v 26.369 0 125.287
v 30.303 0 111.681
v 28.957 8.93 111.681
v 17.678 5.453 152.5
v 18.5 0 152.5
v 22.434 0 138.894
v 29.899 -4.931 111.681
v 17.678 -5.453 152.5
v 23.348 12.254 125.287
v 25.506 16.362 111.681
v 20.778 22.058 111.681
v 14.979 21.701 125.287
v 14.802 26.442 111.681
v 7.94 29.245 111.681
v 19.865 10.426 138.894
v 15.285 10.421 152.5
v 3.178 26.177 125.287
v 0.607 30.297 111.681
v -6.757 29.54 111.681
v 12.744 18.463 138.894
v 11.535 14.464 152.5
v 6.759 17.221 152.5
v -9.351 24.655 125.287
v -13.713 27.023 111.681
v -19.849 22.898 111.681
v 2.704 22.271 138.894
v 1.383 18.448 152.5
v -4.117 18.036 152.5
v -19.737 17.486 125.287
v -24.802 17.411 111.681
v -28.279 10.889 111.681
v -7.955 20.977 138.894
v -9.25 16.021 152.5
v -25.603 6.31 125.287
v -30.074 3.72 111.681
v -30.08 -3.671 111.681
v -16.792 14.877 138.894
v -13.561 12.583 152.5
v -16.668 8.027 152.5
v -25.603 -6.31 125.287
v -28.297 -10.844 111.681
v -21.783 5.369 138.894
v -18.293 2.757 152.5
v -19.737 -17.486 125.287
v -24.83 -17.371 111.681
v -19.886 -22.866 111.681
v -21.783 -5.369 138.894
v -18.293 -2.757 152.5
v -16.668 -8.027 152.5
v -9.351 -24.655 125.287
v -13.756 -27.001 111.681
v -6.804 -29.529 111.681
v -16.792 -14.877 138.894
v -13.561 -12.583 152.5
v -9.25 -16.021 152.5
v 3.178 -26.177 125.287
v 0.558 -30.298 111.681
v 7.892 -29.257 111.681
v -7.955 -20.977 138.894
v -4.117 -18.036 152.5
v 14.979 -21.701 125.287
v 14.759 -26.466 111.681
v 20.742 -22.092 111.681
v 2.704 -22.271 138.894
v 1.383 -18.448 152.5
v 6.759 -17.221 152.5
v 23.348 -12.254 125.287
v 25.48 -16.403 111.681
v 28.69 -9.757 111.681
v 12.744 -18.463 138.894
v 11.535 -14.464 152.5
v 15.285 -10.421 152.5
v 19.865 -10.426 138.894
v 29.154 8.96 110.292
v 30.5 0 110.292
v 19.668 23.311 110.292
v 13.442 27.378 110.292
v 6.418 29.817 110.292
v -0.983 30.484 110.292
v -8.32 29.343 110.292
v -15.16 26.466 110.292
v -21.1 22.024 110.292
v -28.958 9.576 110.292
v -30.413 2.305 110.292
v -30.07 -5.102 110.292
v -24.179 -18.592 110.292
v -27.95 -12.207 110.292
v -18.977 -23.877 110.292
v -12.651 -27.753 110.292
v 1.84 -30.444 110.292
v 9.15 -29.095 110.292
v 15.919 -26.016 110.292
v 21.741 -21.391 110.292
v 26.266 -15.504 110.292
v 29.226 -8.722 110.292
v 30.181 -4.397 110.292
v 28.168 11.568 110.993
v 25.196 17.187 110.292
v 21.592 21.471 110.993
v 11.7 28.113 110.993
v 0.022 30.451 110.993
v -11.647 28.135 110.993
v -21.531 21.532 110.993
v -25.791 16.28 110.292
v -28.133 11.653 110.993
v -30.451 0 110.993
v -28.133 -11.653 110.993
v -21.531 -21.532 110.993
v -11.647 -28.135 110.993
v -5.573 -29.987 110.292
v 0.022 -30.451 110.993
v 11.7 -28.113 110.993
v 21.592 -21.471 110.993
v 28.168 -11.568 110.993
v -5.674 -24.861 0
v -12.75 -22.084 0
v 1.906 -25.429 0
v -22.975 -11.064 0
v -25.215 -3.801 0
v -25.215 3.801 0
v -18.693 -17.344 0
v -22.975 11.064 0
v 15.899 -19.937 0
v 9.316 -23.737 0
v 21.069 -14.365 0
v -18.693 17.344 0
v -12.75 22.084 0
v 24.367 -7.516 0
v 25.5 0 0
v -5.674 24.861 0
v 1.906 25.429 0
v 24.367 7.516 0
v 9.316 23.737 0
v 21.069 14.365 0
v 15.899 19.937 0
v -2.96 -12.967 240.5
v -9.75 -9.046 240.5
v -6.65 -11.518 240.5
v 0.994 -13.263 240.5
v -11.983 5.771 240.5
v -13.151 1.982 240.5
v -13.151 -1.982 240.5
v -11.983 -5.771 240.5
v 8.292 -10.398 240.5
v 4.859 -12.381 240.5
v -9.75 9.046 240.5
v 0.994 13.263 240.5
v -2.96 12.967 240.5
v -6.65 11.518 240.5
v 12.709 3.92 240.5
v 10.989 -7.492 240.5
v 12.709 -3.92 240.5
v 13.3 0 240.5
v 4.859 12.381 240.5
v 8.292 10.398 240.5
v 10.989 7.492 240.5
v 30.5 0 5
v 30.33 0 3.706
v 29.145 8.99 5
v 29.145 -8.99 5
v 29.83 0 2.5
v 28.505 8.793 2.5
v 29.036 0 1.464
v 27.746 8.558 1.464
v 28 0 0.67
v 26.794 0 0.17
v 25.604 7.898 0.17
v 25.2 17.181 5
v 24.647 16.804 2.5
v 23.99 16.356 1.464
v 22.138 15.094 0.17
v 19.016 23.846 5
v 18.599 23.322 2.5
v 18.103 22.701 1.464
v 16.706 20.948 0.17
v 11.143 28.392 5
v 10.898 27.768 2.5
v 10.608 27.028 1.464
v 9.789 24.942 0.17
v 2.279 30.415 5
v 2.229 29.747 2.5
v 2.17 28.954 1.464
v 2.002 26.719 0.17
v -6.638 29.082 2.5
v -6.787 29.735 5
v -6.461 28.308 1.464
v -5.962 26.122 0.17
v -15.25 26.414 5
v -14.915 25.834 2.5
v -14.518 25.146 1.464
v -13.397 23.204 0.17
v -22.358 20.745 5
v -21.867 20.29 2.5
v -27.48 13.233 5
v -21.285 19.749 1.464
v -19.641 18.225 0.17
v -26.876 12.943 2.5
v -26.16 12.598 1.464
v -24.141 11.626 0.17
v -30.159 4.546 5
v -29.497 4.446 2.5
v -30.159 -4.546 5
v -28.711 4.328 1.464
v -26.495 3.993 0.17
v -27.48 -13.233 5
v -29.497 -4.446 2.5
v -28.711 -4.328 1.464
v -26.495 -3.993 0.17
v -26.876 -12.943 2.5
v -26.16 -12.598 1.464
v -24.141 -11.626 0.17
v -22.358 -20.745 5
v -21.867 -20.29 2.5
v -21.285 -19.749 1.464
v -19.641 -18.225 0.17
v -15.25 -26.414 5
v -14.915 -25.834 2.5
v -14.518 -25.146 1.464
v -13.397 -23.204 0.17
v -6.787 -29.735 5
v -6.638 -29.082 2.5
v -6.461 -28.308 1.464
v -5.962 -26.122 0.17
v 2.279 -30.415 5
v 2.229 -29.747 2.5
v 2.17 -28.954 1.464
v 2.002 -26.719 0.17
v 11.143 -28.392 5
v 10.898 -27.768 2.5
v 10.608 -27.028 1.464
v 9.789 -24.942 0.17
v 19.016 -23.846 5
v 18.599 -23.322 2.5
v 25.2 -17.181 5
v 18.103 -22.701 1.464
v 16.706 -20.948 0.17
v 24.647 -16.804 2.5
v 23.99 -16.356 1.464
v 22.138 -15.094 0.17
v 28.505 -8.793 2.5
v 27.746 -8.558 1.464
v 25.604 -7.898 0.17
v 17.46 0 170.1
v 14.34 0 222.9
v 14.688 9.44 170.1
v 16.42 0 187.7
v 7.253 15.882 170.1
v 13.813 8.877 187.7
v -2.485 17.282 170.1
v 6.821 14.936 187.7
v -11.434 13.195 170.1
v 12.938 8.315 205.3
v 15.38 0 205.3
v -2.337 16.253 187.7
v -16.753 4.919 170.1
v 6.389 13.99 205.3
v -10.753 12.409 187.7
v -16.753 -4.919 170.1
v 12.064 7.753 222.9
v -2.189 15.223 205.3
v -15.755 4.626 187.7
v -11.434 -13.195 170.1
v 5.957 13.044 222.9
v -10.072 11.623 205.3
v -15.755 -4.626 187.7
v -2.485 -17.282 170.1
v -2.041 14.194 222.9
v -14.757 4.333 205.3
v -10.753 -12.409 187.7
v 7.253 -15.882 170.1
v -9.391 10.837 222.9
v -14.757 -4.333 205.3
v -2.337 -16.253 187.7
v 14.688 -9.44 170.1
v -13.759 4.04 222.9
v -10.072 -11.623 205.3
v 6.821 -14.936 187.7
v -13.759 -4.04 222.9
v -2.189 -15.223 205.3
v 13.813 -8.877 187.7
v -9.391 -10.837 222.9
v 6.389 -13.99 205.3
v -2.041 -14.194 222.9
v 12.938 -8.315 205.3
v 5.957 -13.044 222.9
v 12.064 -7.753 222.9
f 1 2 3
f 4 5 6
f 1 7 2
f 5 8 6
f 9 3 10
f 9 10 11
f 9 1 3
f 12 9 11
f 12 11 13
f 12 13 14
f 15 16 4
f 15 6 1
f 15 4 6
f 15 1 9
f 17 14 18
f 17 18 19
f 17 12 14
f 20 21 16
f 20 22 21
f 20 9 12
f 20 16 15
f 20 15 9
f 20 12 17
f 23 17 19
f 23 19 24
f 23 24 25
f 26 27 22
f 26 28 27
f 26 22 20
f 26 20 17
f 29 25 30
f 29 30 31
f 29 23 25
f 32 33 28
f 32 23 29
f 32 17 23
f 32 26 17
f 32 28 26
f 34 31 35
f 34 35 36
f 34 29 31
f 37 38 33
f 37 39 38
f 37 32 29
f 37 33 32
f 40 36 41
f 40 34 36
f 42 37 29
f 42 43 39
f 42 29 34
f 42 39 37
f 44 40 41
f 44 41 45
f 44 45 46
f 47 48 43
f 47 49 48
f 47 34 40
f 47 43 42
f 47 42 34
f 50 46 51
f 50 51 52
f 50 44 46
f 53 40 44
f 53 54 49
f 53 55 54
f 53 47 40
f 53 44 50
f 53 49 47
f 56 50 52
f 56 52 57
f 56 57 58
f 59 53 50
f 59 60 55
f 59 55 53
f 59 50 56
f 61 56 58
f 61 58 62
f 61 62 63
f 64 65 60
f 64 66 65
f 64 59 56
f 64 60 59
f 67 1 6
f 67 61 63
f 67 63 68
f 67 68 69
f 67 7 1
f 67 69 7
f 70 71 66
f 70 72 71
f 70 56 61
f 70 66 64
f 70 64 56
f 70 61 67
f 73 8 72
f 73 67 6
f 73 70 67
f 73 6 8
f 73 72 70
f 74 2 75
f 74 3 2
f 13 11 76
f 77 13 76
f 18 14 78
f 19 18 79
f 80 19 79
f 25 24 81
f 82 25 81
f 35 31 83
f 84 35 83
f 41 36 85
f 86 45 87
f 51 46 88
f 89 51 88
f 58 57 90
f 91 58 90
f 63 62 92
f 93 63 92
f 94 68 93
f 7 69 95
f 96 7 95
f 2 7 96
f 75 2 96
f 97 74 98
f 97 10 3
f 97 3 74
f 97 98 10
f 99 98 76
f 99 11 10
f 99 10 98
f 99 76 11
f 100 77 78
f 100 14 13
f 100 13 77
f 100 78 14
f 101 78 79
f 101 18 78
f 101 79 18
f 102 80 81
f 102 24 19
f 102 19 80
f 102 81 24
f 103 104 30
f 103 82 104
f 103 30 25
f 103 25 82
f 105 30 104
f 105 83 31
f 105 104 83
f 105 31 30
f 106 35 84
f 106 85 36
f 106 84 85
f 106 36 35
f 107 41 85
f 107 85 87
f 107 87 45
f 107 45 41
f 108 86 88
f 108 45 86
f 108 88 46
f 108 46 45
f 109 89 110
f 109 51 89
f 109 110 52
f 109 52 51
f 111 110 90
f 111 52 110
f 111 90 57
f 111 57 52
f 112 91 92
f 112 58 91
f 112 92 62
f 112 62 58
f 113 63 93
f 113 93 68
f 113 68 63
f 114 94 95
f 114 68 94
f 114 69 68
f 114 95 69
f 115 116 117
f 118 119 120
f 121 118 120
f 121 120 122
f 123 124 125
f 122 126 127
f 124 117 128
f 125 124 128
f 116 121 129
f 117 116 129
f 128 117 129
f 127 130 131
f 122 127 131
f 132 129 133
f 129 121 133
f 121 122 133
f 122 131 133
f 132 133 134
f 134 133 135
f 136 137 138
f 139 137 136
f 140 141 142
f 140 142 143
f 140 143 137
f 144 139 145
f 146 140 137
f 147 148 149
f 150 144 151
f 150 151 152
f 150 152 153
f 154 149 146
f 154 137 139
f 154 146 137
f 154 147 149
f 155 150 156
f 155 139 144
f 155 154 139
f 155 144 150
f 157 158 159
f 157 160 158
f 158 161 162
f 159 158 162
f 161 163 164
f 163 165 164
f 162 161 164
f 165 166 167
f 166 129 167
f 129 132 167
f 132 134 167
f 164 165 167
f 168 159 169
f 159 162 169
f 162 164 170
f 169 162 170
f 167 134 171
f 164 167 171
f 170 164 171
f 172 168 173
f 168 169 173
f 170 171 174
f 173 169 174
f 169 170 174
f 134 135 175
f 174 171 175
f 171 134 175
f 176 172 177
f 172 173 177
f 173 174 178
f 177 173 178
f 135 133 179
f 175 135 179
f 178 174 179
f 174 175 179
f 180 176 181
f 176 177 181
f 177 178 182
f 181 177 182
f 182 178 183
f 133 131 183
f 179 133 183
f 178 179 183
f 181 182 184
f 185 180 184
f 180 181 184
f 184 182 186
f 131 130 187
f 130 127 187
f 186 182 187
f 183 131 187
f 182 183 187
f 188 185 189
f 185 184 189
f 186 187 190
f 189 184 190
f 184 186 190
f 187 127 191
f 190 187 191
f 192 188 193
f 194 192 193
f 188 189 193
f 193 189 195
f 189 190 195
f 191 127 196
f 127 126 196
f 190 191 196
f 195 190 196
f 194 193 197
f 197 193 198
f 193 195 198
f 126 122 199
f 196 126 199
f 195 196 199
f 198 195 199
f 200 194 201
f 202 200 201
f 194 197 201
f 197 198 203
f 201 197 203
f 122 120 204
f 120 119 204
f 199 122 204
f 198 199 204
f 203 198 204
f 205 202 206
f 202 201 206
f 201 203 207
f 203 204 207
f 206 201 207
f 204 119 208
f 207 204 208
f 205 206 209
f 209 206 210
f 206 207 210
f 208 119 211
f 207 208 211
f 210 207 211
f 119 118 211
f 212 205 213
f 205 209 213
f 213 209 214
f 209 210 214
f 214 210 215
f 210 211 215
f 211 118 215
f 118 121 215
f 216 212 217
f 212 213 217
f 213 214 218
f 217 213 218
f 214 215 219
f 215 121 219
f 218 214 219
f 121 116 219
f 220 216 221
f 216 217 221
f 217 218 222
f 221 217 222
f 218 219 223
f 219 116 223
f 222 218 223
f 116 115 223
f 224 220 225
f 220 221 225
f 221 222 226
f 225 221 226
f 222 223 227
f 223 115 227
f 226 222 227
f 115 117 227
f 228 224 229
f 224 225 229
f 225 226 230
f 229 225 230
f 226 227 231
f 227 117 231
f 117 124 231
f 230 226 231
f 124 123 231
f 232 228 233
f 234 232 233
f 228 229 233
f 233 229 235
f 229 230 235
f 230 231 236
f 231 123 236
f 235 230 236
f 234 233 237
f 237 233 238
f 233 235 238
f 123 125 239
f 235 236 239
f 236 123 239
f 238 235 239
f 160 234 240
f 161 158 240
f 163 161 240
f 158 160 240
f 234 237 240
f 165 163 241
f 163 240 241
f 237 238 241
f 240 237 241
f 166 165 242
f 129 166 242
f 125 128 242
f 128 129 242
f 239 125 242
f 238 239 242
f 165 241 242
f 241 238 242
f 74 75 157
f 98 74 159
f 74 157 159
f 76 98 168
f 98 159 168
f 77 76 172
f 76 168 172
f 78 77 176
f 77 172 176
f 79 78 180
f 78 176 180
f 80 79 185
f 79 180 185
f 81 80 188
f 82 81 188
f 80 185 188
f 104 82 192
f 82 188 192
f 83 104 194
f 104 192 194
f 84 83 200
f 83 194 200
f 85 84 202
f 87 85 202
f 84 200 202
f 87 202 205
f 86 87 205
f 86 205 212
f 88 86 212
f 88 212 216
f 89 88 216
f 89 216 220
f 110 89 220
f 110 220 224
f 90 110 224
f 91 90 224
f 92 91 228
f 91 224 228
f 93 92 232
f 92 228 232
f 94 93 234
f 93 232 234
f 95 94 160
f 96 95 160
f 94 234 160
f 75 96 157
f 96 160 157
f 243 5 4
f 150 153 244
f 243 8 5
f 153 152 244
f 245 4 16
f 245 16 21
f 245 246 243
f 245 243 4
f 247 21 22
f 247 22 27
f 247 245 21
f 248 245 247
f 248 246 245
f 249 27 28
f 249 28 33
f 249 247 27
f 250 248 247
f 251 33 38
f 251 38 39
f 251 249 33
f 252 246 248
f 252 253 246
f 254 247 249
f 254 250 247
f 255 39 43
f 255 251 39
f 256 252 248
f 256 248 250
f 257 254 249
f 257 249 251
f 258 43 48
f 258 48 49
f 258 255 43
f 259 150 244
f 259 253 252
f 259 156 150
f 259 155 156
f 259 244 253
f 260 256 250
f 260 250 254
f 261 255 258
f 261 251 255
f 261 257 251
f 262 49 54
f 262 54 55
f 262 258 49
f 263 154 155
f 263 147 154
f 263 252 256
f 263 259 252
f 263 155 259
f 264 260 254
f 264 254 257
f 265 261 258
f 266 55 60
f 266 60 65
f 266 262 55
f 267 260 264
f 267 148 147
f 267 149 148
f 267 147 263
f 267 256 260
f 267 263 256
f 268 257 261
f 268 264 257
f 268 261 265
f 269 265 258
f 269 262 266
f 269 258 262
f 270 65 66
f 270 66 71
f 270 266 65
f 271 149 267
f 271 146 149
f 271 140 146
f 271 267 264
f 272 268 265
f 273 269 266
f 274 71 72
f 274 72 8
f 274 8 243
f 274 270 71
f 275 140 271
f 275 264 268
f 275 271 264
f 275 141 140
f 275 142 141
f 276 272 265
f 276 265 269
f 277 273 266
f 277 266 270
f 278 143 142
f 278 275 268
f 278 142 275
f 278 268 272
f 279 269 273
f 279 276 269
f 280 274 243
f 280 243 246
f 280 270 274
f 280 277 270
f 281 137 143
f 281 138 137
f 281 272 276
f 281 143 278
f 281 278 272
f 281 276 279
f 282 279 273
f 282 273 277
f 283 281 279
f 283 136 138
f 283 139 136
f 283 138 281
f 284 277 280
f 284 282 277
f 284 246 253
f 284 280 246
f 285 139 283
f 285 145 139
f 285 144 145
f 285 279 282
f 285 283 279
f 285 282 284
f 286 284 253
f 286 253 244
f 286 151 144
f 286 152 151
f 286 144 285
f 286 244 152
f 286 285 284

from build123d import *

# Parameters (mm, degrees)
F0_R      = 30.5
F2_DEPTH  = 111
F2_FACE_R = 30.5
F3_R      = 18.5
F5_R      = 5
F6_R      = 5
F4_FACE_R = 18.5
F8_R      = 13.3


with BuildPart() as f2:
    # F0 (on Top) → F2 (new body)
    with BuildSketch(Plane.XY):
        Circle(F0_R)
    extrude(amount=F2_DEPTH)

    # F2_face (on face) → F4 section 0
    with BuildSketch(Plane.XY.offset(111)):
        Circle(F2_FACE_R)
    # F3 (on offset) → F4 section 1
    with BuildSketch(Plane.XY.offset(152.5)):
        Circle(F3_R)
    loft()

    # F5
    f5_edges = [f2.edges().sort_by_distance(p)[0] for p in [
        (-30.5, 0, 111),
    ]]
    fillet(f5_edges, radius=F5_R)

    # F6
    f6_edges = [f2.edges().sort_by_distance(p)[0] for p in [
        (-30.5, 0, 0),
    ]]
    fillet(f6_edges, radius=F6_R)

    # F4_face (on face) → F9 section 0
    with BuildSketch(Plane.XY.offset(152.5)):
        Circle(F4_FACE_R)
    # F8 (on offset) → F9 section 1
    with BuildSketch(Plane.XY.offset(240.5)):
        Circle(F8_R)
    loft()


solid = f2.part
